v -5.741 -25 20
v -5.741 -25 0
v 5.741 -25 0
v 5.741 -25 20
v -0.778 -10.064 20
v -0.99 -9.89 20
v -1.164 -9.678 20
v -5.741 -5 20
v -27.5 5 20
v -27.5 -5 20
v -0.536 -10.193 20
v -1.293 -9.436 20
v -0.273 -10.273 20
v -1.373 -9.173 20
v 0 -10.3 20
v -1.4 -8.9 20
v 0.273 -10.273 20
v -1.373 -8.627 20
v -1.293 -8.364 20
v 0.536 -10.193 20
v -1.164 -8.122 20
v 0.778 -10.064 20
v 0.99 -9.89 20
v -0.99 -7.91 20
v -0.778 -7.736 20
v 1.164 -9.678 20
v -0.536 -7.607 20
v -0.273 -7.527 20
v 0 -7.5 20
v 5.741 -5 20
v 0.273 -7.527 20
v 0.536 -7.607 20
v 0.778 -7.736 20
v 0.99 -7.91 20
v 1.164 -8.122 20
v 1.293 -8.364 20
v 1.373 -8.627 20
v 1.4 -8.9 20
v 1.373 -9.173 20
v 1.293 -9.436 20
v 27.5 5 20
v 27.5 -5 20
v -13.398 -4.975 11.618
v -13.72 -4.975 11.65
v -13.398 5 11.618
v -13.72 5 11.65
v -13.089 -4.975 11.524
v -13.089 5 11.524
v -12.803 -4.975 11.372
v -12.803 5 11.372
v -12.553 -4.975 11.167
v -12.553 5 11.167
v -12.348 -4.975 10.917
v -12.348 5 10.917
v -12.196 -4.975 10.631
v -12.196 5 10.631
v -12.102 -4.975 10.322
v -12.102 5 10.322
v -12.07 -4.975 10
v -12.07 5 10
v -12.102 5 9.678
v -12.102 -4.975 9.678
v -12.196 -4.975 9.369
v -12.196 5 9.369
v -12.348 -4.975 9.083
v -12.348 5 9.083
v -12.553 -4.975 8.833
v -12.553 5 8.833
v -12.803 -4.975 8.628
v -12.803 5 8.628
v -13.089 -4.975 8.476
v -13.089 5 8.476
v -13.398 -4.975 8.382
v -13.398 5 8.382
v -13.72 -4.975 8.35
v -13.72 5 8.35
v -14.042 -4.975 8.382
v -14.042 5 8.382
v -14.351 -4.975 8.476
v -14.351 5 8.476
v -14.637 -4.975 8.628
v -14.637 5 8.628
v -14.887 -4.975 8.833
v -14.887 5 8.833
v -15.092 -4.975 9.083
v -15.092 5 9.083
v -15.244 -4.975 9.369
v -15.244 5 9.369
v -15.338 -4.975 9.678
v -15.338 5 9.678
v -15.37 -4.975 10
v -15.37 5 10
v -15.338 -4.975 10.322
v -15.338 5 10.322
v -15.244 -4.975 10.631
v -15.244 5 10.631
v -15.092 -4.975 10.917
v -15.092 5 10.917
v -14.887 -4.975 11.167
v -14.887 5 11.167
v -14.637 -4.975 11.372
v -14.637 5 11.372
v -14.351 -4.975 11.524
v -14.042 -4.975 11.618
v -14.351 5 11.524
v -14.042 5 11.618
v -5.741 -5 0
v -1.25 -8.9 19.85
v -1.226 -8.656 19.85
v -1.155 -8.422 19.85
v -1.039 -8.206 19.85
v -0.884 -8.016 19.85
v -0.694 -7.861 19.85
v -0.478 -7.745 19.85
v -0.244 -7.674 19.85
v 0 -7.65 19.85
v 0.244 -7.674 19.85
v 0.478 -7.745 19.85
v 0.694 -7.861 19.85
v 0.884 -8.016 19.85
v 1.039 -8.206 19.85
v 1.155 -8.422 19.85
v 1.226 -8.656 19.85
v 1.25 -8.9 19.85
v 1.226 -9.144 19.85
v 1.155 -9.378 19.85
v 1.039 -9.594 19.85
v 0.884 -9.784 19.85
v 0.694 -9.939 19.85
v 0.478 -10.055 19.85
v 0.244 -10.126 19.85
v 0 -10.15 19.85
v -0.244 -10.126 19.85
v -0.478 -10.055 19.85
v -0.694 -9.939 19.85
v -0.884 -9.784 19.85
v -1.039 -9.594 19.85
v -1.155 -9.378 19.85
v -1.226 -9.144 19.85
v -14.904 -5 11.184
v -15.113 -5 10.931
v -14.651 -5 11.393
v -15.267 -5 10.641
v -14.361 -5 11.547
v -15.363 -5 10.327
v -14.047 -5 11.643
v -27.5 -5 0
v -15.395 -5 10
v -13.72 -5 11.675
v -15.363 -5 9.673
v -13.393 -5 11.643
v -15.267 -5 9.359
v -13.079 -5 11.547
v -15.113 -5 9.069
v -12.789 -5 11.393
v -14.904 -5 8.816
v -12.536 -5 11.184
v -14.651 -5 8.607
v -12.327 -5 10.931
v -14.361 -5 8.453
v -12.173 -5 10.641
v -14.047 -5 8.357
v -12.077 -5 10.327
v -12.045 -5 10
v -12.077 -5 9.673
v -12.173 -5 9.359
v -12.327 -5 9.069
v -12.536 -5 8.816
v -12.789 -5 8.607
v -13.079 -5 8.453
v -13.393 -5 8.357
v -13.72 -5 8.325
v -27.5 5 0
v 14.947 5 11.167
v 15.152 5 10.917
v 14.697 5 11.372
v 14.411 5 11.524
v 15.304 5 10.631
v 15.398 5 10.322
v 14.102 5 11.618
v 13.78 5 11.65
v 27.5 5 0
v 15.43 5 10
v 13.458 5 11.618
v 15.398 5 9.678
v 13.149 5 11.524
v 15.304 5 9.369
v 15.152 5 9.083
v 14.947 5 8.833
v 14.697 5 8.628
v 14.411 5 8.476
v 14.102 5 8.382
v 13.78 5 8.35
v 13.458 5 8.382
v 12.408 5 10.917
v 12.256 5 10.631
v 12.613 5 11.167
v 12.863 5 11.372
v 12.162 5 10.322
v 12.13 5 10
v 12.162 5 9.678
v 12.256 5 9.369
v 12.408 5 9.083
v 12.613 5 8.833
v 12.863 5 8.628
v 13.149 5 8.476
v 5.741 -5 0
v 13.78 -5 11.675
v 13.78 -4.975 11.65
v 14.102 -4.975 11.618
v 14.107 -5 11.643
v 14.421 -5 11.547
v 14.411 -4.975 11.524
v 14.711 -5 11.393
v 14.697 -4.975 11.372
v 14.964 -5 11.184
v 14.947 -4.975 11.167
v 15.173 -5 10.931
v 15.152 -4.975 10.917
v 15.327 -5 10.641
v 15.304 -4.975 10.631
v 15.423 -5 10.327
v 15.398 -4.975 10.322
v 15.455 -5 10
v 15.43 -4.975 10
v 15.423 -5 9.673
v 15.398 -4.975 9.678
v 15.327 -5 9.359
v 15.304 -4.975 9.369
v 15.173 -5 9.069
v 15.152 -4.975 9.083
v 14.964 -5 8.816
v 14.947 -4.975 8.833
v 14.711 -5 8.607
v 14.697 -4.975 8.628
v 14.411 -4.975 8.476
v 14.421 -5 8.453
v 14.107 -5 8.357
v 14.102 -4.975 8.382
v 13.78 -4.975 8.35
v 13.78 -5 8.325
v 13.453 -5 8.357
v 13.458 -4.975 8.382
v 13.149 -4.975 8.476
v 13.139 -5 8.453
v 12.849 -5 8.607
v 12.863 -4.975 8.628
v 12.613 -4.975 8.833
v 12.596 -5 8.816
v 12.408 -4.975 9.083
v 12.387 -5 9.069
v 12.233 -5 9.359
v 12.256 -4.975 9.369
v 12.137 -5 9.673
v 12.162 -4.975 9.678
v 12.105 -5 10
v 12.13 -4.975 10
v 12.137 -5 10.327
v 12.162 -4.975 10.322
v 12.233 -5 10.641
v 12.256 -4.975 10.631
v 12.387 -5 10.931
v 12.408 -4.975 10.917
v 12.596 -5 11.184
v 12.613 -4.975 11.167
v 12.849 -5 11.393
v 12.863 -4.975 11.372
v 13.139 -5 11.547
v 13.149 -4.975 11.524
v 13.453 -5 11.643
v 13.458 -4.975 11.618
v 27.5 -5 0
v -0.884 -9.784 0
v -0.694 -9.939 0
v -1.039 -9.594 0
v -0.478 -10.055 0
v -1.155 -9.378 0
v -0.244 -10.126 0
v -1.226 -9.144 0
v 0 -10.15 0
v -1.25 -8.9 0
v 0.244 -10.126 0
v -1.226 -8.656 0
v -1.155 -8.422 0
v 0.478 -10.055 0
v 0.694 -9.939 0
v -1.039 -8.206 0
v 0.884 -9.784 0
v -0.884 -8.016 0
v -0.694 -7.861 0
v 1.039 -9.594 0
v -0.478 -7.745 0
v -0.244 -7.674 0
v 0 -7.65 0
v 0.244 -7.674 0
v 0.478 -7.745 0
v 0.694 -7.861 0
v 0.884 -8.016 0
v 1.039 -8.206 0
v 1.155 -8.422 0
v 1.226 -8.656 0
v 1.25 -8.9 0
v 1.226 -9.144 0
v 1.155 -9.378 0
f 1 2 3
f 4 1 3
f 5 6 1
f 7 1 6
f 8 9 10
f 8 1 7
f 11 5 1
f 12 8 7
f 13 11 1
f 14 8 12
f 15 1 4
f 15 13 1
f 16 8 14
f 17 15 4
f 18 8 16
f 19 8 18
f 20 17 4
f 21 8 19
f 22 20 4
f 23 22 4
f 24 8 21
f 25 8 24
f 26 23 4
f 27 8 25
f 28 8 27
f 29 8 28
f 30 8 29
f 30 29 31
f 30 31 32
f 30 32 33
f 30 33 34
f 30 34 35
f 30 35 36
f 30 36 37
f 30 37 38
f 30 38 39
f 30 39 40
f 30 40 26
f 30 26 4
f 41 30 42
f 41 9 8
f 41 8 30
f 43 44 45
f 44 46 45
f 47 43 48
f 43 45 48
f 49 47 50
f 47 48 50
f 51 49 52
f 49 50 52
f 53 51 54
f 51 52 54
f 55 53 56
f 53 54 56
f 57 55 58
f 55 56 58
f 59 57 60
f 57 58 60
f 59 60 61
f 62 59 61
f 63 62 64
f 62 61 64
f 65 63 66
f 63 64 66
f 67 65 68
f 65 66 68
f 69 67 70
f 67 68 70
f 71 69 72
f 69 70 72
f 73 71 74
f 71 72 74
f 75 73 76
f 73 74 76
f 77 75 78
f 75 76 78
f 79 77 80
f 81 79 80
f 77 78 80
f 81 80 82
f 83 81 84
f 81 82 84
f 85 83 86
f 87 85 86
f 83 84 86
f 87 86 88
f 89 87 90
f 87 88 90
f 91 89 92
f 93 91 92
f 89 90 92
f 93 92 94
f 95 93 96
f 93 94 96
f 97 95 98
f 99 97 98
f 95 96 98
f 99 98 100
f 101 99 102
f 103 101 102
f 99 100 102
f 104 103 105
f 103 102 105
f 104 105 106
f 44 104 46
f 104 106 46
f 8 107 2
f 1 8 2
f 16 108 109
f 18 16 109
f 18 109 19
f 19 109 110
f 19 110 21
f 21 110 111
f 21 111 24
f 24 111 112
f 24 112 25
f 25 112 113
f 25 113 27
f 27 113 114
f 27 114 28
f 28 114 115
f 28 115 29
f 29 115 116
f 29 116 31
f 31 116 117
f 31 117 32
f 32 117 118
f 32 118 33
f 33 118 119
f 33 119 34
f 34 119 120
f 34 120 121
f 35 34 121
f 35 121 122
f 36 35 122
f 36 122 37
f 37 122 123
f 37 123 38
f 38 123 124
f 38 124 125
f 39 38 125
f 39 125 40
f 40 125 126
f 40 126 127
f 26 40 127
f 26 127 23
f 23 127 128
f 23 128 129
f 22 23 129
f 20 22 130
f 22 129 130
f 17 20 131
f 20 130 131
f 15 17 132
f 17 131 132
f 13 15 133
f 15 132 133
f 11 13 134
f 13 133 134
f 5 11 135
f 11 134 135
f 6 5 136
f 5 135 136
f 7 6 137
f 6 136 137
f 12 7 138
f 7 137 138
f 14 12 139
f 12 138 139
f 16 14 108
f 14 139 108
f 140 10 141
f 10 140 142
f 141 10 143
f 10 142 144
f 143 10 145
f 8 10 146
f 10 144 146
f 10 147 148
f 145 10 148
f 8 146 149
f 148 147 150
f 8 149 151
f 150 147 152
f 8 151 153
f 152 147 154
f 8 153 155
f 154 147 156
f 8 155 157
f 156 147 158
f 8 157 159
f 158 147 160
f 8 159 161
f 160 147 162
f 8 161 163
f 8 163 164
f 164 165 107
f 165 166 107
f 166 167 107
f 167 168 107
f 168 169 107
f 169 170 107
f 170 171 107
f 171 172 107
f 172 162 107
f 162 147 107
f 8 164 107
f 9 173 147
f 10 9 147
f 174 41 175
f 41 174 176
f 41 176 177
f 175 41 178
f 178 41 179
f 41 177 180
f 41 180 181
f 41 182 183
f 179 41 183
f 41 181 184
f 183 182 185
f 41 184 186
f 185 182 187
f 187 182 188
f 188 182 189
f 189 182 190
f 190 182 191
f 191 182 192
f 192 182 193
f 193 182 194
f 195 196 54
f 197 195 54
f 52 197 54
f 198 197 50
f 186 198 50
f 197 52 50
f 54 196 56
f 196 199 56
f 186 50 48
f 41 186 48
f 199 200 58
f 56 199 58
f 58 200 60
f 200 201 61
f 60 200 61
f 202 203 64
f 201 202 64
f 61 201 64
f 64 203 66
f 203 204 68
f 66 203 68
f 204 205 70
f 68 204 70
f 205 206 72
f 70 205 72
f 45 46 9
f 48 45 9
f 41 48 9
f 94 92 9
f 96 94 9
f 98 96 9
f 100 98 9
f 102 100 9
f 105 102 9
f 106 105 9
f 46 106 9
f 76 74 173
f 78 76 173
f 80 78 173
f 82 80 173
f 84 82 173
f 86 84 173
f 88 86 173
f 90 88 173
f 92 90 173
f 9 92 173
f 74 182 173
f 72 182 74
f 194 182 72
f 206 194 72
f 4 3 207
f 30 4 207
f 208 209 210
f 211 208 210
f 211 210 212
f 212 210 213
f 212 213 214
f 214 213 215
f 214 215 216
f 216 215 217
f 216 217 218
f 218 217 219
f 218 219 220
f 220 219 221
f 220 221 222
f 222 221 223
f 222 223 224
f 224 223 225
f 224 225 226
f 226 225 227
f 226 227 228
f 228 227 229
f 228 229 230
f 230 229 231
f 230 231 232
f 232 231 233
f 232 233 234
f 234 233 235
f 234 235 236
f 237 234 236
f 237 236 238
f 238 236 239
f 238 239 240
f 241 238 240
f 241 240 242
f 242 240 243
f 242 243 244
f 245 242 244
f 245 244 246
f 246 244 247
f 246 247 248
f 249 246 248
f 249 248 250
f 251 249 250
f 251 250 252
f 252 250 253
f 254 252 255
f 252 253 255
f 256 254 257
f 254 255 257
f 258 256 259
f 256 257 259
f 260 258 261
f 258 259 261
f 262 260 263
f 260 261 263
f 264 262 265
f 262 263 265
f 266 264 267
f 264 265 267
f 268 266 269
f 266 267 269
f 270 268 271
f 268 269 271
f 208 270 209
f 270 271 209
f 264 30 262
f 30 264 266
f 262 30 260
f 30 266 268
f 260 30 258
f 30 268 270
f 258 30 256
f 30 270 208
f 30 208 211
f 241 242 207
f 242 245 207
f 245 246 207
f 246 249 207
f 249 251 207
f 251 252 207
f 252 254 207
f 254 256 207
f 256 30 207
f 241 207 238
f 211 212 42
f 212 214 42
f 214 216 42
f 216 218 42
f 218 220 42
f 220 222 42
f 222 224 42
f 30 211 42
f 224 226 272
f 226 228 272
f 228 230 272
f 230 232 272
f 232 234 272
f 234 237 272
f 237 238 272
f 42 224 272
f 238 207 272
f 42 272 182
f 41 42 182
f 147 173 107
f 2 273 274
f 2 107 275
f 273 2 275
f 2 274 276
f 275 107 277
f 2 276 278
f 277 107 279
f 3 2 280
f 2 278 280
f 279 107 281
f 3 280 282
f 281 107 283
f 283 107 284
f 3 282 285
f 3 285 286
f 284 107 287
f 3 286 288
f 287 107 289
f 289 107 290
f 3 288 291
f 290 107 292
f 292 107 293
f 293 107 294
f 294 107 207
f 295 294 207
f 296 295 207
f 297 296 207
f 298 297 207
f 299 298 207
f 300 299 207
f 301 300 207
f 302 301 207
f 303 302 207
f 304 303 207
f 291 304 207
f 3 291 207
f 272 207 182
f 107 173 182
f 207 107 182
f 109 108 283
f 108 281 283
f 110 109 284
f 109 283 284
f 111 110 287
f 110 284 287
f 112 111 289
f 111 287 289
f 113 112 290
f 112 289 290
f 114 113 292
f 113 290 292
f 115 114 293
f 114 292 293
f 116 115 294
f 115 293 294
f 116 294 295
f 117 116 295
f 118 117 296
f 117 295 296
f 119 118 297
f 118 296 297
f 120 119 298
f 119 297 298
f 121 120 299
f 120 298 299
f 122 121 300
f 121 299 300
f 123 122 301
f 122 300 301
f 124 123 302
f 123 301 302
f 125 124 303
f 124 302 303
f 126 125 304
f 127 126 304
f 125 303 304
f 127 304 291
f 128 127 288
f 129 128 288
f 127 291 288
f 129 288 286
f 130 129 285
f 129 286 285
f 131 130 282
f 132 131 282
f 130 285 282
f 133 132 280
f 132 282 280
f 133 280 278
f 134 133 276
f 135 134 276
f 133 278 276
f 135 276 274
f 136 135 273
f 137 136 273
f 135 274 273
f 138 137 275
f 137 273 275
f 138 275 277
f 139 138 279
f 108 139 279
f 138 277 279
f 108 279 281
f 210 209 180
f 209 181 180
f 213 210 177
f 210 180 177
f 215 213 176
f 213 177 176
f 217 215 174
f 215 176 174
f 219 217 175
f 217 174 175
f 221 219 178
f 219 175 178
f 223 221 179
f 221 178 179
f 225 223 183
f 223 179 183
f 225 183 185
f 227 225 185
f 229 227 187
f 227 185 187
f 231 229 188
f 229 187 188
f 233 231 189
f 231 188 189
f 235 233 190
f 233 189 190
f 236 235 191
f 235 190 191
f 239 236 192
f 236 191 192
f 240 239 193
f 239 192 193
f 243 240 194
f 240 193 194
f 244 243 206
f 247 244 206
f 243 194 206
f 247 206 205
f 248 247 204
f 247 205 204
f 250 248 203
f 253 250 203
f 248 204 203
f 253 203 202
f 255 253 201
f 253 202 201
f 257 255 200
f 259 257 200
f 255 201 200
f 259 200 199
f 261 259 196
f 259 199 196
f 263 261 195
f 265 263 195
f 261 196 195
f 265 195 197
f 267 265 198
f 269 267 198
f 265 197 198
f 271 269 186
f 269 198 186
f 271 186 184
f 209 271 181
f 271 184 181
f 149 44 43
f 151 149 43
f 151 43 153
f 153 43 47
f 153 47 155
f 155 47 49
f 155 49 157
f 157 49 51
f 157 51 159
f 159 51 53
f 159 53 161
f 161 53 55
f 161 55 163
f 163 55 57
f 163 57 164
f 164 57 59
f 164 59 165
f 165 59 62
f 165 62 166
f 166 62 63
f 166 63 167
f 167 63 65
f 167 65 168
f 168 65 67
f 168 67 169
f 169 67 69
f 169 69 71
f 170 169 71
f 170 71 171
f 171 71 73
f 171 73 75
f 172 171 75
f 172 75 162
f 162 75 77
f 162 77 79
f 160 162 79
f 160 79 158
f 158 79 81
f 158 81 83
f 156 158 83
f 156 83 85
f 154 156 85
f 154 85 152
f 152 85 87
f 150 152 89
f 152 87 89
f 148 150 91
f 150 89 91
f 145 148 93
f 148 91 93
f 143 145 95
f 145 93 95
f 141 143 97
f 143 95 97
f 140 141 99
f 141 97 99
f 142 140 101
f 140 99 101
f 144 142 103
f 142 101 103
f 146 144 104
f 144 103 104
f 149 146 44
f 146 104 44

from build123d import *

# Parameters (mm, degrees)
BOSS_EXTRUDE1_DEPTH               = 20
TAP_DRILL_FOR_M3_TAP1_D           = 2.5
TAP_DRILL_FOR_M3_TAP1_CSINK_D     = 2.8
TAP_DRILL_FOR_M3_TAP1_CSINK_ANGLE = 90
TAP_DRILL_FOR_M4_TAP1_D           = 3.3
TAP_DRILL_FOR_M4_TAP1_CSINK_D     = 3.35
TAP_DRILL_FOR_M4_TAP1_CSINK_ANGLE = 90


with BuildPart() as part:
    # Sketch1 → Boss-Extrude1 (new body)
    with BuildSketch(Plane.XY):
        Polygon((5.74072013, -5), (27.5, -5), (27.5, 5), (-27.5, 5), (-27.5, -5), (-5.74072013, -5), (-5.74072013, -25), (5.74072013, -25), align=None)
    extrude(amount=BOSS_EXTRUDE1_DEPTH)

    # Tap Drill for M3 Tap1 (through all)
    with Locations(Plane(origin=(0, -8.9, 20), x_dir=(1, 0, 0), z_dir=(0, 0, 1))):
        with Locations((0, 0)):
            CounterSinkHole(TAP_DRILL_FOR_M3_TAP1_D / 2, TAP_DRILL_FOR_M3_TAP1_CSINK_D / 2, counter_sink_angle=TAP_DRILL_FOR_M3_TAP1_CSINK_ANGLE)

    # Tap Drill for M4 Tap1 (through all)
    with Locations(Plane(origin=(13.78, -5, 10), x_dir=(0, 0, -1), z_dir=(0, -1, 0))):
        with Locations((0, 0), (0, -27.5)):
            CounterSinkHole(TAP_DRILL_FOR_M4_TAP1_D / 2, TAP_DRILL_FOR_M4_TAP1_CSINK_D / 2, counter_sink_angle=TAP_DRILL_FOR_M4_TAP1_CSINK_ANGLE)


solid = part.part
